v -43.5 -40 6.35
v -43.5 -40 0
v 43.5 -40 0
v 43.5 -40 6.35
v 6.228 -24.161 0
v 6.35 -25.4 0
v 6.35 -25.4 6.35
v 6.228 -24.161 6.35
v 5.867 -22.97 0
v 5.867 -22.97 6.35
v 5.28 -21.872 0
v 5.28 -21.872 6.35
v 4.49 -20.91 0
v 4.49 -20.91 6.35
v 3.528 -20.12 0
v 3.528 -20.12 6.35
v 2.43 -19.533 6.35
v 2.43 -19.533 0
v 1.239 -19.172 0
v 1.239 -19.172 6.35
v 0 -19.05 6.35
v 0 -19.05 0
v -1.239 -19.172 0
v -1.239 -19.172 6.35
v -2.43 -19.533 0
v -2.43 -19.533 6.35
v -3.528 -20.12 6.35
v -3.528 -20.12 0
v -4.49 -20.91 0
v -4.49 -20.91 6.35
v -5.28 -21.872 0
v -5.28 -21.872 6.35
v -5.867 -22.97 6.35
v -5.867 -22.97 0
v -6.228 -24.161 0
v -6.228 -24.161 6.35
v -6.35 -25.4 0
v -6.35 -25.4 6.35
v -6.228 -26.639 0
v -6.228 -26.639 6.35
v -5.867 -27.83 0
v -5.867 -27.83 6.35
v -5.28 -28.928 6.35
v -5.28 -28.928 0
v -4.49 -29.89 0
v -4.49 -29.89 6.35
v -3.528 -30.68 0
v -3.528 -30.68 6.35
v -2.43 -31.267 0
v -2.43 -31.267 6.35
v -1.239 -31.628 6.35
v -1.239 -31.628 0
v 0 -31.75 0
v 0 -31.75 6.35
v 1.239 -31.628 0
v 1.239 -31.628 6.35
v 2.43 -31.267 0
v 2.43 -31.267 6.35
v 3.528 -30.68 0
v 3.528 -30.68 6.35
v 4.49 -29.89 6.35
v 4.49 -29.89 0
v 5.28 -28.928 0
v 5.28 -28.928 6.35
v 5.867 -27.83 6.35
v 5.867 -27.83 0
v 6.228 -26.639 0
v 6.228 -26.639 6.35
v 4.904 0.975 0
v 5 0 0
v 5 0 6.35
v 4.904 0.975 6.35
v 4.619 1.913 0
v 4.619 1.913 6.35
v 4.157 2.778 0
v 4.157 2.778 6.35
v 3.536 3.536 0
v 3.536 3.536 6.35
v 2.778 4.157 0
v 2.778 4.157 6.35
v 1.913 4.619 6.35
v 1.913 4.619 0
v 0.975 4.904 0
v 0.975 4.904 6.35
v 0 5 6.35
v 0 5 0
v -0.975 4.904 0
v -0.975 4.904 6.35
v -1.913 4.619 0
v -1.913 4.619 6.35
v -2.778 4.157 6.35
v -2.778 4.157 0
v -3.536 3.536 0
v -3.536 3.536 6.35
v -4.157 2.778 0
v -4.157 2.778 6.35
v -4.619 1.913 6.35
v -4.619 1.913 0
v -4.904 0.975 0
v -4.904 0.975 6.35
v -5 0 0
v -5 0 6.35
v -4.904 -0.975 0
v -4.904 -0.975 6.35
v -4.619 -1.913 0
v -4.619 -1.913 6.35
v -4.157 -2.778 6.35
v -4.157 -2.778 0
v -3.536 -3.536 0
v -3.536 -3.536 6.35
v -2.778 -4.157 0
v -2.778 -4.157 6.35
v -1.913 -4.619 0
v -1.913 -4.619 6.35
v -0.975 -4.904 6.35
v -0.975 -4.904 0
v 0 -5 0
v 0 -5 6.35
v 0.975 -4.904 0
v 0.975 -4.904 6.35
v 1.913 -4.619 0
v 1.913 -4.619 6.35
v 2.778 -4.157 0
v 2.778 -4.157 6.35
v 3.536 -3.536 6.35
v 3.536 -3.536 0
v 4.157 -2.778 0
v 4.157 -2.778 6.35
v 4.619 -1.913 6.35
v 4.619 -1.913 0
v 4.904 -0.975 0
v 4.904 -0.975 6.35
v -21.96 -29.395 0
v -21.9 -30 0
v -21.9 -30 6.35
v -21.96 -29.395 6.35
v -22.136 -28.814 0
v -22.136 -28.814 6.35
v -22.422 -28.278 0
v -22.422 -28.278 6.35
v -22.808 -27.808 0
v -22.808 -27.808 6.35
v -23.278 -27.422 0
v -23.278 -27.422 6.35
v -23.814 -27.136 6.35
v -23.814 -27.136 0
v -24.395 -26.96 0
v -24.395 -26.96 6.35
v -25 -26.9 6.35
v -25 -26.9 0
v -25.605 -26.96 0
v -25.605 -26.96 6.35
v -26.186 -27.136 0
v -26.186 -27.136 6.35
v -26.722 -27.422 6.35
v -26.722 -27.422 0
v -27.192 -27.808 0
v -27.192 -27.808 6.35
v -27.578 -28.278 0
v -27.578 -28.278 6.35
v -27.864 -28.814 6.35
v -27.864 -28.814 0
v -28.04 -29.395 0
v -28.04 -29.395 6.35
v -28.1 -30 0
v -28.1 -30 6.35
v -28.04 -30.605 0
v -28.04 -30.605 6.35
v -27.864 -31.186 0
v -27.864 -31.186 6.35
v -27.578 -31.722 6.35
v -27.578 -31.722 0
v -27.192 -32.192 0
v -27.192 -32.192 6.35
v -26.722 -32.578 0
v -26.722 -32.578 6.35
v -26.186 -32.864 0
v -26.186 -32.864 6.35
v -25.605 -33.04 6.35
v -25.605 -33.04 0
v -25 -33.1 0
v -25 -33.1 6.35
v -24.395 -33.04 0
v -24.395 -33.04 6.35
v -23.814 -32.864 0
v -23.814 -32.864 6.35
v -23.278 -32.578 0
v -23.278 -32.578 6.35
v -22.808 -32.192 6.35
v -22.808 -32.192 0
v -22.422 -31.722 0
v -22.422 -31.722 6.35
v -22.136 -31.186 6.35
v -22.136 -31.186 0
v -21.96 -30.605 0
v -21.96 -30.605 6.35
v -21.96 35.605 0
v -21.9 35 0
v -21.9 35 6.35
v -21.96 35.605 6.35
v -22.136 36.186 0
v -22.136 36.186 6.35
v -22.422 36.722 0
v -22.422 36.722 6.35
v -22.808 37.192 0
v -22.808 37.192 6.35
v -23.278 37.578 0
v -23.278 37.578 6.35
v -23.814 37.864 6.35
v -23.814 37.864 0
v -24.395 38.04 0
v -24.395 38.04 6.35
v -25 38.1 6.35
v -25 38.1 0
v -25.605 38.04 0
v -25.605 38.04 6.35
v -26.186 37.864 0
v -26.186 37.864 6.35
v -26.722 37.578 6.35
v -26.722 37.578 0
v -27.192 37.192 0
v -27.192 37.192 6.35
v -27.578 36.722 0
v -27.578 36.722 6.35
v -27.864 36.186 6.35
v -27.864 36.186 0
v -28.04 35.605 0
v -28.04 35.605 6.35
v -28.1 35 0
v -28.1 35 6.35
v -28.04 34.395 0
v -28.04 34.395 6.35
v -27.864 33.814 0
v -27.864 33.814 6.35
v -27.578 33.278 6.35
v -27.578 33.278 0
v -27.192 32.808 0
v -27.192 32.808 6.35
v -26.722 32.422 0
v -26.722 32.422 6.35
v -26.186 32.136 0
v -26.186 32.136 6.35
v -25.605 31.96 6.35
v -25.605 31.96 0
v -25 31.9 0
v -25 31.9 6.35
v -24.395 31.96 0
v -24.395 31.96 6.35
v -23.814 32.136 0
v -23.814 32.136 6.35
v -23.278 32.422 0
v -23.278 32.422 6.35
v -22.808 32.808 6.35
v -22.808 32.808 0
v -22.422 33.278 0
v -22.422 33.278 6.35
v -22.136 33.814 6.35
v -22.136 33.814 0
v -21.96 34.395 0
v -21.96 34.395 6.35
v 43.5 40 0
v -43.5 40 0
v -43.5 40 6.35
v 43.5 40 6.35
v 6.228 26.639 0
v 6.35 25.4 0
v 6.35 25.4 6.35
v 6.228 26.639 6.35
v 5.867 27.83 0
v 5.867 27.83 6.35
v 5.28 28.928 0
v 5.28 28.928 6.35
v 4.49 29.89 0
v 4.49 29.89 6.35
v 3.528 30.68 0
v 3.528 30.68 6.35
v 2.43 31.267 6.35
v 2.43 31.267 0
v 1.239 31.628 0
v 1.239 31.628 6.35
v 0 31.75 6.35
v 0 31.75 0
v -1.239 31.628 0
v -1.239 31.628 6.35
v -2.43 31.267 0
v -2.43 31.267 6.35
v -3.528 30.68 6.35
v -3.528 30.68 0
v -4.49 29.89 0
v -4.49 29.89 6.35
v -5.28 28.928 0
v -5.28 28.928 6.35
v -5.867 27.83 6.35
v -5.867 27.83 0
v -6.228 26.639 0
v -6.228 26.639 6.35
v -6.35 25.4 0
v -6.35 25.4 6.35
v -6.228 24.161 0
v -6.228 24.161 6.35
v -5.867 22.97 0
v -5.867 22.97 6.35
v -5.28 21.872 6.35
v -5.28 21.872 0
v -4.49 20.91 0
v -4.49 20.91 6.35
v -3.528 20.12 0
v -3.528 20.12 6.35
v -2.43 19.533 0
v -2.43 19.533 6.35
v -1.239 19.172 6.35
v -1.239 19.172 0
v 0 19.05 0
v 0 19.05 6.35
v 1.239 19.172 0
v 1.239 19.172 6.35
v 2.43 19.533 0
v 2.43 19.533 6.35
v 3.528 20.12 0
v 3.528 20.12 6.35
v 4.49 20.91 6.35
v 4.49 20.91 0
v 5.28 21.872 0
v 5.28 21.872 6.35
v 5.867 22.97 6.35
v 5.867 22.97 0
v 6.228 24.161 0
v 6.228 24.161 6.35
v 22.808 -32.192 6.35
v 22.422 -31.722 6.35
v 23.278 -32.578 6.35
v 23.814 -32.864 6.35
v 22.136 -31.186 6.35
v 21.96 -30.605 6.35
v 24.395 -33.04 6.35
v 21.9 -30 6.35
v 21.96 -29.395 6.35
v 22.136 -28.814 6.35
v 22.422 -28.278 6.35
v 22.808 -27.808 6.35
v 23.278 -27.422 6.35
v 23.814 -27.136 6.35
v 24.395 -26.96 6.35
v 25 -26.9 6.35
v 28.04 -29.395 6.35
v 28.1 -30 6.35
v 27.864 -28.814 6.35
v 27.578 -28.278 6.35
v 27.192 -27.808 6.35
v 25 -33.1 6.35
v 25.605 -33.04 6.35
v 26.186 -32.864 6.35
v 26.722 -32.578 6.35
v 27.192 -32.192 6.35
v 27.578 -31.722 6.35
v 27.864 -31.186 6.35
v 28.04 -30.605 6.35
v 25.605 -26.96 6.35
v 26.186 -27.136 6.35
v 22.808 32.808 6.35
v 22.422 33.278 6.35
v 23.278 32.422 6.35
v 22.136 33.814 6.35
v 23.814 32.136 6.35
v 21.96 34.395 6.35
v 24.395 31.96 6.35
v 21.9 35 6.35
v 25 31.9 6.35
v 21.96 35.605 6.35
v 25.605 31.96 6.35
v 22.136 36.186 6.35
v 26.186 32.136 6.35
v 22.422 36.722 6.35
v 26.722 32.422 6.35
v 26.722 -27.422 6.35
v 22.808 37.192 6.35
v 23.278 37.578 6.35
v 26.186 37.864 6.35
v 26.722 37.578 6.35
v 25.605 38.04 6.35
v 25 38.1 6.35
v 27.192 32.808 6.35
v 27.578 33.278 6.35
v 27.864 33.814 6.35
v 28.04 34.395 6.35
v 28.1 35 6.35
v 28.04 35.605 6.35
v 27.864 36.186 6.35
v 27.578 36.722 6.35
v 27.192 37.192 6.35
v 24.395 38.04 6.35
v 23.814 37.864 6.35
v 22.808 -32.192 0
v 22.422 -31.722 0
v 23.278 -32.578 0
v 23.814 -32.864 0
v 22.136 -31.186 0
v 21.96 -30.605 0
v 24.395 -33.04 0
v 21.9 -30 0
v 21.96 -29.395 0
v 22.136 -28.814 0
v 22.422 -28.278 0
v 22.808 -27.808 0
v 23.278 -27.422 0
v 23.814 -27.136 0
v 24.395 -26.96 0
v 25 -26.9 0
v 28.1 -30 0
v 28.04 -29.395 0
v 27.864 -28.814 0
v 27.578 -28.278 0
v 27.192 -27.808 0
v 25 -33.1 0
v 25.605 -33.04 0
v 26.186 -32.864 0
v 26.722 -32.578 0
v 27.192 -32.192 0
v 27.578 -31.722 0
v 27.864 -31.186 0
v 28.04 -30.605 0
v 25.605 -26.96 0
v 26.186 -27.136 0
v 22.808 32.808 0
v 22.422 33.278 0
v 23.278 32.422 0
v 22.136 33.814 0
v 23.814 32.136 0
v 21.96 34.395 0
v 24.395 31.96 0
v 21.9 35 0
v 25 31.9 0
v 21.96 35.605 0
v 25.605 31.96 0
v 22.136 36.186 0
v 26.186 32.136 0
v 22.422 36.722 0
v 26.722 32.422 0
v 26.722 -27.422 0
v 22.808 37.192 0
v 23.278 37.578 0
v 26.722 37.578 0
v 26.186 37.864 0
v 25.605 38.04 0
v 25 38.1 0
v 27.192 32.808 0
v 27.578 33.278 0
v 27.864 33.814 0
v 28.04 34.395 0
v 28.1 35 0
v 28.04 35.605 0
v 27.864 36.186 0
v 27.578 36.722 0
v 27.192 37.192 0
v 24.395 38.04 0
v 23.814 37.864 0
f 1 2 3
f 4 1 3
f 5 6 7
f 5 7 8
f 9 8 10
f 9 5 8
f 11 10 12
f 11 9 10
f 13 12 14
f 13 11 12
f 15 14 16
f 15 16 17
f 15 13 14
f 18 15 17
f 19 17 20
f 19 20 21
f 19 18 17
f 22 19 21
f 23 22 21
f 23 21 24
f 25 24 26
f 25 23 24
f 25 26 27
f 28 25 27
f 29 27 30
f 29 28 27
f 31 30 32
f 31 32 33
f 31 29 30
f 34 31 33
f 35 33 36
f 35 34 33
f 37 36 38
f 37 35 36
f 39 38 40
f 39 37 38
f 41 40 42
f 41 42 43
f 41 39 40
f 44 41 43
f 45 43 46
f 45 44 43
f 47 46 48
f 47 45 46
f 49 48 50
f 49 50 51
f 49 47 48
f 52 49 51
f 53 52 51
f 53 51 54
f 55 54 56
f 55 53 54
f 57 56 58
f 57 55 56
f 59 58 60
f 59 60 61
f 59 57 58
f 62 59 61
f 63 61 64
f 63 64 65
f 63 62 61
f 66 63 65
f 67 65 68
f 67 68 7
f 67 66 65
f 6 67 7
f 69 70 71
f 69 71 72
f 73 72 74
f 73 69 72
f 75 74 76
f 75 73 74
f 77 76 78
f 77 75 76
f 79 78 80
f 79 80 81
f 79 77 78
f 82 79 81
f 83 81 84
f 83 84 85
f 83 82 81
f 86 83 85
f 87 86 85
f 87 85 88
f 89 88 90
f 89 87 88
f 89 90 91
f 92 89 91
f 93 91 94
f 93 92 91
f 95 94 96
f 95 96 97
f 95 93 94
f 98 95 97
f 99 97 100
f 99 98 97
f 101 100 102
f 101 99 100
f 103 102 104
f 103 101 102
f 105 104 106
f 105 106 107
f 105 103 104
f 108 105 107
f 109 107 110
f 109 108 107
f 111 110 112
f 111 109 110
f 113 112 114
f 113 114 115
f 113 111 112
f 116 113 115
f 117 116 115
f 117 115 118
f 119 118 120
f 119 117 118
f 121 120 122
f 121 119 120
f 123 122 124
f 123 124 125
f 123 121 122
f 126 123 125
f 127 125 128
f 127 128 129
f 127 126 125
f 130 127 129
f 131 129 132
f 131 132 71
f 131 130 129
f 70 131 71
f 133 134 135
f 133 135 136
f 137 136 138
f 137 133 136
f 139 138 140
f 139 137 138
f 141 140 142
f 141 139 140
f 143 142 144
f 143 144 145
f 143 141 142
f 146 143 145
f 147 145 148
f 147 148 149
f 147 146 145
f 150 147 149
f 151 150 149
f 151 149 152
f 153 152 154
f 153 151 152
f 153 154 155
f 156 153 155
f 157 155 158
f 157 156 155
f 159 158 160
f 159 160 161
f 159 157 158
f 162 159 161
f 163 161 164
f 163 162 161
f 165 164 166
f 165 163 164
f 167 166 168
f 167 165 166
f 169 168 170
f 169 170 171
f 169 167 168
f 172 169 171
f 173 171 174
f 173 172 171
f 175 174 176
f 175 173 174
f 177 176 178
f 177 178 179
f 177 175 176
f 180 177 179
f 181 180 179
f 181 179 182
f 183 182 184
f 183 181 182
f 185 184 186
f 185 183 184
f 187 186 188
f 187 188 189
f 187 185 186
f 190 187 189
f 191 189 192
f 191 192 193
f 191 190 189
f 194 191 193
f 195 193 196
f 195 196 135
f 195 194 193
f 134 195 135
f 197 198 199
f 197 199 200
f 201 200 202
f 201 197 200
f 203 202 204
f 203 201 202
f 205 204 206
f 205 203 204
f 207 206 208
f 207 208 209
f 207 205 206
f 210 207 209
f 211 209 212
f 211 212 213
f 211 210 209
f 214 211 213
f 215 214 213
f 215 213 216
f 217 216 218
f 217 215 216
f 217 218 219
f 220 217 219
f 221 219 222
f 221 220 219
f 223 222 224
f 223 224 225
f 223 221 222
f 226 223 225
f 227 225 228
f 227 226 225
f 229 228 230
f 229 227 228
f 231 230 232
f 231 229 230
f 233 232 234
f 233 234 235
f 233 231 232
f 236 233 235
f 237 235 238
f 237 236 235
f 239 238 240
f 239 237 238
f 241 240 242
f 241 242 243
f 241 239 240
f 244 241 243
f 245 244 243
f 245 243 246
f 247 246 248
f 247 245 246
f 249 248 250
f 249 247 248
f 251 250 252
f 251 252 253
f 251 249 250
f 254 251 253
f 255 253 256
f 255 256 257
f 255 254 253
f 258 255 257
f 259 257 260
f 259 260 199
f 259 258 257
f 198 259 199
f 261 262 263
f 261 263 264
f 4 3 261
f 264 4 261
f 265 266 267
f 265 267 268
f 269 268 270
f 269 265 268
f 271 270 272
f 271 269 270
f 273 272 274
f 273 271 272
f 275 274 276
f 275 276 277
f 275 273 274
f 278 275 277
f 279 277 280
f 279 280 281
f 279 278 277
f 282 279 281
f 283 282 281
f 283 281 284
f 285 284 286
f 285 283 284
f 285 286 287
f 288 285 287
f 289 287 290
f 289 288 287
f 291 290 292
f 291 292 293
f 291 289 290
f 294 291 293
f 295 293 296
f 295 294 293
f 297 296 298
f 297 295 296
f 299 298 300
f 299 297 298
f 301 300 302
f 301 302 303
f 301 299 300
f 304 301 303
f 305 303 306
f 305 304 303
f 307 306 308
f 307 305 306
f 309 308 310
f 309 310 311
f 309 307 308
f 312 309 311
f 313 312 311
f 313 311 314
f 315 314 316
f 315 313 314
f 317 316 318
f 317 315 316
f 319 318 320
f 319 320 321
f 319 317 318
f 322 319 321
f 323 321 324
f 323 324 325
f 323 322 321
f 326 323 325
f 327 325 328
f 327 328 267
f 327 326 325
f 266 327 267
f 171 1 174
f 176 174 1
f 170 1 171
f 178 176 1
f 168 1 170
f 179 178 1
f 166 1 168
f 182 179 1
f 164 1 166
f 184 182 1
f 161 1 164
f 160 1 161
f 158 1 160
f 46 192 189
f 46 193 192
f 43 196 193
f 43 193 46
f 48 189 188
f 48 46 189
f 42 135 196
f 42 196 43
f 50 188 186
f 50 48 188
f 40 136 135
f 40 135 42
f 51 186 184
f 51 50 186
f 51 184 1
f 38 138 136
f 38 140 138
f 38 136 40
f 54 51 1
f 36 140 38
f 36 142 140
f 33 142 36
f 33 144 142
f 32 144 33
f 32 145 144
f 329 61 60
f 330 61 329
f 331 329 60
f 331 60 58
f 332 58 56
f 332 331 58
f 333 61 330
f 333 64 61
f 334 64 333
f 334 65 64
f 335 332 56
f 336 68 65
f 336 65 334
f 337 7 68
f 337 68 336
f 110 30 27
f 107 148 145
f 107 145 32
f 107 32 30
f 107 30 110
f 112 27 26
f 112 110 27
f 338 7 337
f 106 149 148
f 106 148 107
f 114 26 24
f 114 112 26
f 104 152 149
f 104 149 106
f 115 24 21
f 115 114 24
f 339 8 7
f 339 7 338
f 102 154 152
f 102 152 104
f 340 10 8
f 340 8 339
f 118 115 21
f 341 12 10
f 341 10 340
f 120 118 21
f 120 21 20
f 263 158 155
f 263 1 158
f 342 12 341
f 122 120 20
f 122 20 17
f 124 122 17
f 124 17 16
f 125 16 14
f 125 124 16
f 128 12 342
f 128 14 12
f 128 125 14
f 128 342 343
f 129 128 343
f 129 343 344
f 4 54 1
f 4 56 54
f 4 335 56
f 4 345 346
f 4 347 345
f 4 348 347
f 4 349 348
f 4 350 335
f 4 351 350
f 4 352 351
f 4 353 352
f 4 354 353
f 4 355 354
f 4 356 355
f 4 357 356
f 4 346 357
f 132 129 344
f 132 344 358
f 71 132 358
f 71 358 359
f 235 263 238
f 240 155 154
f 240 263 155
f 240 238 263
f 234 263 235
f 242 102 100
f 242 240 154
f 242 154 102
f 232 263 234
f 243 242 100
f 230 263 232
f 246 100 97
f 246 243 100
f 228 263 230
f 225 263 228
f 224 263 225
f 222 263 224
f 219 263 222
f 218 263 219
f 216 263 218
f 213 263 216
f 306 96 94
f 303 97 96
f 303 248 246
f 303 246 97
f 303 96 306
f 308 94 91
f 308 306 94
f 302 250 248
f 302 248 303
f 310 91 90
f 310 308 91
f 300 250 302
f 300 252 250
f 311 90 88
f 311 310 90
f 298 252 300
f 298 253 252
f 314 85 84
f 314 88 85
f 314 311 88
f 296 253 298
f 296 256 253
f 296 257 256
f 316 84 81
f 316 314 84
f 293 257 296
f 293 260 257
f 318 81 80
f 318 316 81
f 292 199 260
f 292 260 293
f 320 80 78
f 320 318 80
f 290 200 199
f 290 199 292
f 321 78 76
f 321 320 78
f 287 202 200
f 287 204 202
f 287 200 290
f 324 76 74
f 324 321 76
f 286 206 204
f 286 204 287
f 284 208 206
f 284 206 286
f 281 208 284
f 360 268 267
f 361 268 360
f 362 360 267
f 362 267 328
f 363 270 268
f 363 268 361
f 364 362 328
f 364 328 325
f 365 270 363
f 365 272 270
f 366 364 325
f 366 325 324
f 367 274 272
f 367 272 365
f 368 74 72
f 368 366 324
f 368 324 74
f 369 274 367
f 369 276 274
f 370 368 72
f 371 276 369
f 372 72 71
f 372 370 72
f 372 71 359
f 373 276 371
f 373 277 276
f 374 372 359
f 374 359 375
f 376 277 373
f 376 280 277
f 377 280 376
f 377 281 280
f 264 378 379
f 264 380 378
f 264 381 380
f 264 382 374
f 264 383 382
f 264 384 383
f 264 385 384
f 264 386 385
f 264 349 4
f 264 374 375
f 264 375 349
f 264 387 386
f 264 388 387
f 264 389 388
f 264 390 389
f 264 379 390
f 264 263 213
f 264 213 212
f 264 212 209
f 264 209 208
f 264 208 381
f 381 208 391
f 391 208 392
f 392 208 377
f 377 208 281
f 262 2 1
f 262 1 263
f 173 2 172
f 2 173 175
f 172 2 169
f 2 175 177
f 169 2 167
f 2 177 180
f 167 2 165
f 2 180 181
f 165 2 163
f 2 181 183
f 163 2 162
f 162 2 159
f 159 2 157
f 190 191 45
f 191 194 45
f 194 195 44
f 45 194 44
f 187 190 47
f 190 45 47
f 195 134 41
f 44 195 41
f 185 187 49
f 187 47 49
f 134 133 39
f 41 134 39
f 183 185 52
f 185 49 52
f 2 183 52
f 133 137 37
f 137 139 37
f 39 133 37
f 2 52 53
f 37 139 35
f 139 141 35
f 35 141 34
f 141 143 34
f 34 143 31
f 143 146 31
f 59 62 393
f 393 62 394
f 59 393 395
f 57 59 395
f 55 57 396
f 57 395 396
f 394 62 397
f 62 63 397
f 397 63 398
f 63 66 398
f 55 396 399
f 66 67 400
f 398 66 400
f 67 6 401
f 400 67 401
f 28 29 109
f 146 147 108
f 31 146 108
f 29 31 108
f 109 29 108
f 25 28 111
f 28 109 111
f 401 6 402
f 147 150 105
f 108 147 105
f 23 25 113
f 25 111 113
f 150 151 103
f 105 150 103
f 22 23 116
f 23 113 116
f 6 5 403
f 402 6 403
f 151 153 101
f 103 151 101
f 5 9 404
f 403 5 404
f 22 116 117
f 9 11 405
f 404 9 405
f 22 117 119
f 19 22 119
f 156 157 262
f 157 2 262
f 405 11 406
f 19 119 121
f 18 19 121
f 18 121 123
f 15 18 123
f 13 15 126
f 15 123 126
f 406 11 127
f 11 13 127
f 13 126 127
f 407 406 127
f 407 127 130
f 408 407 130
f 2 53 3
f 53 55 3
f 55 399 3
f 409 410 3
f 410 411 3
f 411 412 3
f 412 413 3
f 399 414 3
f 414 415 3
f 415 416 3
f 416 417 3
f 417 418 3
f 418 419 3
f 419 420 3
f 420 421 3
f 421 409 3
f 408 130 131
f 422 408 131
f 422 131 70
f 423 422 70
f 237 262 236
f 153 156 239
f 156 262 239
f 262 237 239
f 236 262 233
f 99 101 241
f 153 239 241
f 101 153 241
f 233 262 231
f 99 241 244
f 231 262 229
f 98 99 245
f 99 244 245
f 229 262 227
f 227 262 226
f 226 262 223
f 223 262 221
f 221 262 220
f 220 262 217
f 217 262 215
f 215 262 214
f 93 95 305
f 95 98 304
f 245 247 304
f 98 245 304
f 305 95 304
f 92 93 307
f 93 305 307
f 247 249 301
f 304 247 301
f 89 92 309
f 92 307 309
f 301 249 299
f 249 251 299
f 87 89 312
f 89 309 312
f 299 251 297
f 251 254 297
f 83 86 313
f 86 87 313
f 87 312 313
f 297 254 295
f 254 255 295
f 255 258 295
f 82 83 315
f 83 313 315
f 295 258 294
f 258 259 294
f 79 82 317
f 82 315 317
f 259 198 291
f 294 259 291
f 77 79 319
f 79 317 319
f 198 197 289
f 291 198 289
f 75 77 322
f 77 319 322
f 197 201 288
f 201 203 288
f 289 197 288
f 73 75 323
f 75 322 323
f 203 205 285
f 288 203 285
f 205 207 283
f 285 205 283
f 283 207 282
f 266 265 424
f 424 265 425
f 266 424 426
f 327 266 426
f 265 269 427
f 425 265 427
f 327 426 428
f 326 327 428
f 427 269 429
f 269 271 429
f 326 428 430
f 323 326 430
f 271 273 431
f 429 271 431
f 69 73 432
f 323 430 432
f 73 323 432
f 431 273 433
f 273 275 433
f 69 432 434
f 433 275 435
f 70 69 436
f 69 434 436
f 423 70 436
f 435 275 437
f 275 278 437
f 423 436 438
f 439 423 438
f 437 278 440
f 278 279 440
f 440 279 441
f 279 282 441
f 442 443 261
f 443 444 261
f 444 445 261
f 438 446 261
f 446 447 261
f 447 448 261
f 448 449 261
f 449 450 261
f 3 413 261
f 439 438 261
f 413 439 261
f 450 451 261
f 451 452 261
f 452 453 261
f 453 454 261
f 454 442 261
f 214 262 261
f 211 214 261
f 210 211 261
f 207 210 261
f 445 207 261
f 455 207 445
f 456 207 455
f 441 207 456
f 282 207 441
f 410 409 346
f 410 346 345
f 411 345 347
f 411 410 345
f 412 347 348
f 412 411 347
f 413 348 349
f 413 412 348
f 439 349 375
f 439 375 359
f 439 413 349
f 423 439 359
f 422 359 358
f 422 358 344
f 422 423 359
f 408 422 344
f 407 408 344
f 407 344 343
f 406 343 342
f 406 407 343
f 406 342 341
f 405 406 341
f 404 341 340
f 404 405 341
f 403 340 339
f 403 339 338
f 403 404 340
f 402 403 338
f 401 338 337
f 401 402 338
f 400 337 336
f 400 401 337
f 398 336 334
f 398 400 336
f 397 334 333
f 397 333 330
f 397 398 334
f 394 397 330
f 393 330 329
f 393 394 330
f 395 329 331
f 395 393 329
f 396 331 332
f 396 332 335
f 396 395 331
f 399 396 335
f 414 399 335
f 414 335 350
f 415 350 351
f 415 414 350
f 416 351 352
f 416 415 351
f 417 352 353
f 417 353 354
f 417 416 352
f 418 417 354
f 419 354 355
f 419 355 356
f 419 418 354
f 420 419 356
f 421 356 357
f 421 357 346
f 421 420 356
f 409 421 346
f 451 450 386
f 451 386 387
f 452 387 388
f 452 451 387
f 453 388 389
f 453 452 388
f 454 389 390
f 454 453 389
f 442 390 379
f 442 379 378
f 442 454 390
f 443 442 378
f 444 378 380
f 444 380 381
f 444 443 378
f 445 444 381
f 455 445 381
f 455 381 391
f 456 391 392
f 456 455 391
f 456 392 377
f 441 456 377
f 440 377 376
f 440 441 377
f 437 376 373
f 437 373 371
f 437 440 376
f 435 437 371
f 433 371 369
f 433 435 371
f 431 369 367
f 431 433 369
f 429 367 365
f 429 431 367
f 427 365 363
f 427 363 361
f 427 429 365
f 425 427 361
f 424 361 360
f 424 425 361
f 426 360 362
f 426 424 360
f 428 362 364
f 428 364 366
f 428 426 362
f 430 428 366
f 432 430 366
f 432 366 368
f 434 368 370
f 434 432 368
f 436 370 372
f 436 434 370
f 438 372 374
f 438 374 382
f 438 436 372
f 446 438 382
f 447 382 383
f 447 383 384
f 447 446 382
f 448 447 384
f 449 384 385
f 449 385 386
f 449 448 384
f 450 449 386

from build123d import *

# Parameters (mm, degrees)
CROQUIS1_W              = 87
CROQUIS1_H              = 80
CROQUIS1_R              = 3.1
CROQUIS1_R_2            = 6.35
CROQUIS1_R_3            = 5
SALIENTE_EXTRUIR1_DEPTH = 6.35


with BuildPart() as part:
    # Croquis1 → Saliente-Extruir1 (new body)
    with BuildSketch(Plane.XY):
        Rectangle(CROQUIS1_W, CROQUIS1_H)
        with Locations((-25, 35)):
            Circle(CROQUIS1_R, mode=Mode.SUBTRACT)
        with Locations((25, 35)):
            Circle(CROQUIS1_R, mode=Mode.SUBTRACT)
        with Locations((0, 25.4)):
            Circle(CROQUIS1_R_2, mode=Mode.SUBTRACT)
        with Locations((0, -25.4)):
            Circle(CROQUIS1_R_2, mode=Mode.SUBTRACT)
        with Locations((-25, -30)):
            Circle(CROQUIS1_R, mode=Mode.SUBTRACT)
        with Locations((25, -30)):
            Circle(CROQUIS1_R, mode=Mode.SUBTRACT)
        Circle(CROQUIS1_R_3, mode=Mode.SUBTRACT)
    extrude(amount=SALIENTE_EXTRUIR1_DEPTH)


solid = part.part
